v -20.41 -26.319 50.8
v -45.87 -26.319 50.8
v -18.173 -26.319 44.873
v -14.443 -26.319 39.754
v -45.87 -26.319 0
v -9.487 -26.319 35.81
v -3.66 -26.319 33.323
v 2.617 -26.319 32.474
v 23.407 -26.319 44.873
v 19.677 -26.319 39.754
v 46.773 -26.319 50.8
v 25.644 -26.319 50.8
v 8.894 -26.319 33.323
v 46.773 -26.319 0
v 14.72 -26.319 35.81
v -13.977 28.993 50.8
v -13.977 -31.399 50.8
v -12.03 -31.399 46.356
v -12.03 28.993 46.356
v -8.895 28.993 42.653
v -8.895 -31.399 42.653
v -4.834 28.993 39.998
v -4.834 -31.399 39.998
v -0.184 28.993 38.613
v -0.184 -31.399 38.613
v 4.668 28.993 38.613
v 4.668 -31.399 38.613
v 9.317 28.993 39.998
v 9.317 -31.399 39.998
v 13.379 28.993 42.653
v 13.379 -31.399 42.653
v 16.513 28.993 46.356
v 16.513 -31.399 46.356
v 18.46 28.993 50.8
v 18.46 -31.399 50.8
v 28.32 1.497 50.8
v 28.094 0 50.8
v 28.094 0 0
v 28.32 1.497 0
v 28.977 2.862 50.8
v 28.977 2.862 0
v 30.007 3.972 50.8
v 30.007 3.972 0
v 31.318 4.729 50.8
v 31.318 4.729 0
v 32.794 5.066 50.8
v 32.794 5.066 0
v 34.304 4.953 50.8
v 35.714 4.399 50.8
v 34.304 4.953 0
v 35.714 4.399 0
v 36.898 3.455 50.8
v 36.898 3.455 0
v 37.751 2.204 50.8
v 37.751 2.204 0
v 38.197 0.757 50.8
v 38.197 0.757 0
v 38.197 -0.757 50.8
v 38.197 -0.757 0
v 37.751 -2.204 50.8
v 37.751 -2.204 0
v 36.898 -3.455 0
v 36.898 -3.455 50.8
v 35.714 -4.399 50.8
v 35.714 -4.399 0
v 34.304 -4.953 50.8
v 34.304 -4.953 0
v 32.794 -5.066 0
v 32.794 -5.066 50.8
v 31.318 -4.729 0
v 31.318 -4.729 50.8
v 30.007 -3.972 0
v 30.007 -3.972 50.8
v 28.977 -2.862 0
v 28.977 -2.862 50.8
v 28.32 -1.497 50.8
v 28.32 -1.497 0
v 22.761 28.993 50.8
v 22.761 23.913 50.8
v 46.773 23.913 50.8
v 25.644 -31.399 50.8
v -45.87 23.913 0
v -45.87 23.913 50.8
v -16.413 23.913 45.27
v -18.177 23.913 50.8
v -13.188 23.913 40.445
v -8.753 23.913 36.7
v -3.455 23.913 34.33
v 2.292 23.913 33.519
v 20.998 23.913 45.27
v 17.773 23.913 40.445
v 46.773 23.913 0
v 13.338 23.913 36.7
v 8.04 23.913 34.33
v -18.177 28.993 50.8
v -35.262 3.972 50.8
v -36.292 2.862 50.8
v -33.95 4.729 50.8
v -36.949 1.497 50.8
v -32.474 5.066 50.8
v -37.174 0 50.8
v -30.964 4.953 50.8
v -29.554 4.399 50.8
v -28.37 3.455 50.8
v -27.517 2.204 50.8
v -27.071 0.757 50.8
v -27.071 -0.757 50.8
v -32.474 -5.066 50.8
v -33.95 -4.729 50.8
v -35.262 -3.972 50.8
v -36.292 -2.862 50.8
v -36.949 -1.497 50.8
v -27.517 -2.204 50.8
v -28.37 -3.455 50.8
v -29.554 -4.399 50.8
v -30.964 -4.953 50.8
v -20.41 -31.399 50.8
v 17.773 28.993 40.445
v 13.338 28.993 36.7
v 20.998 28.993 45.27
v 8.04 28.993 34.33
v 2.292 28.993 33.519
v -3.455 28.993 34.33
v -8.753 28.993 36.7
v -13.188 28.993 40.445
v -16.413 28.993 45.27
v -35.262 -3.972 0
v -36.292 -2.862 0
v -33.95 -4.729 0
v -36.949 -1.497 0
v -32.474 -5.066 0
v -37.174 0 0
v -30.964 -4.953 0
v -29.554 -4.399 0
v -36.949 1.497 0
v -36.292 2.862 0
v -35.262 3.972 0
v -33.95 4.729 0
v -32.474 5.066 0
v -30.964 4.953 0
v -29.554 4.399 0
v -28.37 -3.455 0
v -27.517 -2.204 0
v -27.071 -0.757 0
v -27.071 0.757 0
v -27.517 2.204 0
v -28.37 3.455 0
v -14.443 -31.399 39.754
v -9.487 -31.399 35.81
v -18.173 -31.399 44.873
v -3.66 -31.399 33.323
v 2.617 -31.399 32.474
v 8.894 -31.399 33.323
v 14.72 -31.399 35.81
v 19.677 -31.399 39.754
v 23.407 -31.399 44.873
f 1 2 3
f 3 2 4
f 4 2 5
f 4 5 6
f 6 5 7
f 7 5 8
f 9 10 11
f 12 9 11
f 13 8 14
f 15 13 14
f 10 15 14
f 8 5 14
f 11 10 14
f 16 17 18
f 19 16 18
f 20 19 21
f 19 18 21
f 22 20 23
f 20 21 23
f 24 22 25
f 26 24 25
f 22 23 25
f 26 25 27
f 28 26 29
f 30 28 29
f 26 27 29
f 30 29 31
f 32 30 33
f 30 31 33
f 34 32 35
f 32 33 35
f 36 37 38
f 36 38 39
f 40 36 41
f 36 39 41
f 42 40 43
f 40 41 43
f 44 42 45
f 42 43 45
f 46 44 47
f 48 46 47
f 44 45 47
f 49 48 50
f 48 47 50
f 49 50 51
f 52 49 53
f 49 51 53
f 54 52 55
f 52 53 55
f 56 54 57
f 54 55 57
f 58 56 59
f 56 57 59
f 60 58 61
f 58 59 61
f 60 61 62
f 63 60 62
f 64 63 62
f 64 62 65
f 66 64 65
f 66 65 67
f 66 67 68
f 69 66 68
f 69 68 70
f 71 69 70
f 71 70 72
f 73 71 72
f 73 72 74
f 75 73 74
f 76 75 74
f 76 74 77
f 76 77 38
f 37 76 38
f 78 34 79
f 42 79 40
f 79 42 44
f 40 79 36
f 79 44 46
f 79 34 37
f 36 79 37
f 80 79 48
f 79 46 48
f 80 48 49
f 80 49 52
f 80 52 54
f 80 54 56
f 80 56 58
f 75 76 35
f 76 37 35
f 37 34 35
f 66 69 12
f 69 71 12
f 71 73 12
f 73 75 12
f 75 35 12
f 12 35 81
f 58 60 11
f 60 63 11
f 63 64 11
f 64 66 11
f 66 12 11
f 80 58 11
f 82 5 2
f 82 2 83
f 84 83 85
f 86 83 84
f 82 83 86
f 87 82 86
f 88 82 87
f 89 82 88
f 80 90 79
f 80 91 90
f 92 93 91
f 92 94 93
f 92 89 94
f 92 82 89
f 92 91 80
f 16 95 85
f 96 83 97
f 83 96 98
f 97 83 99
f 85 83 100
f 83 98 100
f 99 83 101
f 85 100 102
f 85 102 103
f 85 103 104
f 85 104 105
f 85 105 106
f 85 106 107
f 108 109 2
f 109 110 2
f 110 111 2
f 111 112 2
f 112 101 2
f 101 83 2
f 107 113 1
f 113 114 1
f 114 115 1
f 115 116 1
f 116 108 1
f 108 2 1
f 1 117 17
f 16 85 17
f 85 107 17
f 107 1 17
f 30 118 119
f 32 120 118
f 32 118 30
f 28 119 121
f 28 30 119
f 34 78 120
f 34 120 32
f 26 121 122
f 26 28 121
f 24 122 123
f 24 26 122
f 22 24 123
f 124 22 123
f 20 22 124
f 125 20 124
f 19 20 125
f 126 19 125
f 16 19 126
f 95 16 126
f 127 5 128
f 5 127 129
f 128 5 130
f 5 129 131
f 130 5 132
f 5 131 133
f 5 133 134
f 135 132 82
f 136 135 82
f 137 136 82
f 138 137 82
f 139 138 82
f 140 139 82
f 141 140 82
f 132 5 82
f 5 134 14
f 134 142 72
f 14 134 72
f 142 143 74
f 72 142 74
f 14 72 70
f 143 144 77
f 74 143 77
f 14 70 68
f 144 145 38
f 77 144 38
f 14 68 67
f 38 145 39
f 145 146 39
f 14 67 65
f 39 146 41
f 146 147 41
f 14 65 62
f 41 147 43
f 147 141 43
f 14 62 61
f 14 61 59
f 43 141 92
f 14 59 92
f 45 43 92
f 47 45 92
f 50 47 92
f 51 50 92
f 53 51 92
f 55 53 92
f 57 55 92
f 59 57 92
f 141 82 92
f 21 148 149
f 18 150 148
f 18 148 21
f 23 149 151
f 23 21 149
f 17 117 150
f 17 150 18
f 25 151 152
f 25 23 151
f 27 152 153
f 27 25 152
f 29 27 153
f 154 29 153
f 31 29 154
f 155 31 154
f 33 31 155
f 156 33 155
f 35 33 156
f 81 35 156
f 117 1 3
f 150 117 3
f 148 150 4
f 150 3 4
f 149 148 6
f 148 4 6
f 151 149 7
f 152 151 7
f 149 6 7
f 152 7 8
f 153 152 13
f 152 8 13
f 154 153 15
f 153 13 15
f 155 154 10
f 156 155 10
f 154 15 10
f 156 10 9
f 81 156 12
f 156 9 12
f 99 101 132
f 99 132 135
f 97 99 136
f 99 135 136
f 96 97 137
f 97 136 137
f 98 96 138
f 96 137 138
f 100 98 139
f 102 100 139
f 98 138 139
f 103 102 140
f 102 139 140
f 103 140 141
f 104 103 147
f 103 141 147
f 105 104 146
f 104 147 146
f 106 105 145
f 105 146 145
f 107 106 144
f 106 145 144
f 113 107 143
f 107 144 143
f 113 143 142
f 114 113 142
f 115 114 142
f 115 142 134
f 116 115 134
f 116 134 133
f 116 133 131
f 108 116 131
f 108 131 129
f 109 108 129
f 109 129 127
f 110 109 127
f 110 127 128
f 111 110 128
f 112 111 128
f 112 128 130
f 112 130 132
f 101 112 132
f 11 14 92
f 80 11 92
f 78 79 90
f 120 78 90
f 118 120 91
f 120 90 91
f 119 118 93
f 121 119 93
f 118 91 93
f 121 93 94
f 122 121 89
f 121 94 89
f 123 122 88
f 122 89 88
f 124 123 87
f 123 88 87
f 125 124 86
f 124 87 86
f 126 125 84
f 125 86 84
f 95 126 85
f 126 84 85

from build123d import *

# Parameters (mm, degrees)
F0_W     = 92.643157
F0_H     = 50.231842
F1_DEPTH = 50.8
F3_DEPTH = 91.948
F4_DEPTH = 5.08
F6_DEPTH = 5.08
F9_D     = 10.16


with BuildPart() as f1:
    # F0 (on Top) → F1 (new body)
    with BuildSketch(Plane.XY):
        with Locations((0.451185, -1.203158)):
            Rectangle(F0_W, F0_H)
    extrude(amount=F1_DEPTH)

    # F2 (on face) → F3 (cut)
    with BuildSketch(Plane.XZ.offset(26.319079)):
        with BuildLine():
            Line((18.460125, 50.8), (-13.976645, 50.8))
            ThreePointArc((-13.976645, 50.8), (2.24174, 38.437578), (18.460125, 50.8))
        make_face()
    extrude(amount=-F3_DEPTH, mode=Mode.SUBTRACT)

    # F2 (on face) → F4 (join)
    with BuildSketch(Plane.XZ.offset(26.319079)):
        with BuildLine():
            ThreePointArc((18.460125, 50.8), (2.24174, 38.437578), (-13.976645, 50.8))
            Line((-13.976645, 50.8), (-20.409722, 50.8))
            ThreePointArc((-20.409722, 50.8), (2.616898, 32.474383), (25.643518, 50.8))
            Line((25.643518, 50.8), (18.460125, 50.8))
        make_face()
    extrude(amount=F4_DEPTH)

    # F5 (on face) → F6 (join)
    with BuildSketch(Plane(origin=(0, 23.912763, 0), x_dir=(-1, 0, 0), z_dir=(0, 1, 0))):
        with BuildLine():
            Line((-18.460125, 50.8), (-22.761472, 50.8))
            ThreePointArc((-22.761472, 50.8), (-2.292335, 33.518654), (18.176802, 50.8))
            Line((18.176802, 50.8), (13.976645, 50.8))
            ThreePointArc((13.976645, 50.8), (-2.24174, 38.437578), (-18.460125, 50.8))
        make_face()
    extrude(amount=F6_DEPTH)

    # F9 (through all)
    with Locations(Plane.XY.offset(50.8)):
        with Locations((-32.094348, 0), (33.174038, 0)):
            Hole(F9_D / 2)


solid = f1.part
